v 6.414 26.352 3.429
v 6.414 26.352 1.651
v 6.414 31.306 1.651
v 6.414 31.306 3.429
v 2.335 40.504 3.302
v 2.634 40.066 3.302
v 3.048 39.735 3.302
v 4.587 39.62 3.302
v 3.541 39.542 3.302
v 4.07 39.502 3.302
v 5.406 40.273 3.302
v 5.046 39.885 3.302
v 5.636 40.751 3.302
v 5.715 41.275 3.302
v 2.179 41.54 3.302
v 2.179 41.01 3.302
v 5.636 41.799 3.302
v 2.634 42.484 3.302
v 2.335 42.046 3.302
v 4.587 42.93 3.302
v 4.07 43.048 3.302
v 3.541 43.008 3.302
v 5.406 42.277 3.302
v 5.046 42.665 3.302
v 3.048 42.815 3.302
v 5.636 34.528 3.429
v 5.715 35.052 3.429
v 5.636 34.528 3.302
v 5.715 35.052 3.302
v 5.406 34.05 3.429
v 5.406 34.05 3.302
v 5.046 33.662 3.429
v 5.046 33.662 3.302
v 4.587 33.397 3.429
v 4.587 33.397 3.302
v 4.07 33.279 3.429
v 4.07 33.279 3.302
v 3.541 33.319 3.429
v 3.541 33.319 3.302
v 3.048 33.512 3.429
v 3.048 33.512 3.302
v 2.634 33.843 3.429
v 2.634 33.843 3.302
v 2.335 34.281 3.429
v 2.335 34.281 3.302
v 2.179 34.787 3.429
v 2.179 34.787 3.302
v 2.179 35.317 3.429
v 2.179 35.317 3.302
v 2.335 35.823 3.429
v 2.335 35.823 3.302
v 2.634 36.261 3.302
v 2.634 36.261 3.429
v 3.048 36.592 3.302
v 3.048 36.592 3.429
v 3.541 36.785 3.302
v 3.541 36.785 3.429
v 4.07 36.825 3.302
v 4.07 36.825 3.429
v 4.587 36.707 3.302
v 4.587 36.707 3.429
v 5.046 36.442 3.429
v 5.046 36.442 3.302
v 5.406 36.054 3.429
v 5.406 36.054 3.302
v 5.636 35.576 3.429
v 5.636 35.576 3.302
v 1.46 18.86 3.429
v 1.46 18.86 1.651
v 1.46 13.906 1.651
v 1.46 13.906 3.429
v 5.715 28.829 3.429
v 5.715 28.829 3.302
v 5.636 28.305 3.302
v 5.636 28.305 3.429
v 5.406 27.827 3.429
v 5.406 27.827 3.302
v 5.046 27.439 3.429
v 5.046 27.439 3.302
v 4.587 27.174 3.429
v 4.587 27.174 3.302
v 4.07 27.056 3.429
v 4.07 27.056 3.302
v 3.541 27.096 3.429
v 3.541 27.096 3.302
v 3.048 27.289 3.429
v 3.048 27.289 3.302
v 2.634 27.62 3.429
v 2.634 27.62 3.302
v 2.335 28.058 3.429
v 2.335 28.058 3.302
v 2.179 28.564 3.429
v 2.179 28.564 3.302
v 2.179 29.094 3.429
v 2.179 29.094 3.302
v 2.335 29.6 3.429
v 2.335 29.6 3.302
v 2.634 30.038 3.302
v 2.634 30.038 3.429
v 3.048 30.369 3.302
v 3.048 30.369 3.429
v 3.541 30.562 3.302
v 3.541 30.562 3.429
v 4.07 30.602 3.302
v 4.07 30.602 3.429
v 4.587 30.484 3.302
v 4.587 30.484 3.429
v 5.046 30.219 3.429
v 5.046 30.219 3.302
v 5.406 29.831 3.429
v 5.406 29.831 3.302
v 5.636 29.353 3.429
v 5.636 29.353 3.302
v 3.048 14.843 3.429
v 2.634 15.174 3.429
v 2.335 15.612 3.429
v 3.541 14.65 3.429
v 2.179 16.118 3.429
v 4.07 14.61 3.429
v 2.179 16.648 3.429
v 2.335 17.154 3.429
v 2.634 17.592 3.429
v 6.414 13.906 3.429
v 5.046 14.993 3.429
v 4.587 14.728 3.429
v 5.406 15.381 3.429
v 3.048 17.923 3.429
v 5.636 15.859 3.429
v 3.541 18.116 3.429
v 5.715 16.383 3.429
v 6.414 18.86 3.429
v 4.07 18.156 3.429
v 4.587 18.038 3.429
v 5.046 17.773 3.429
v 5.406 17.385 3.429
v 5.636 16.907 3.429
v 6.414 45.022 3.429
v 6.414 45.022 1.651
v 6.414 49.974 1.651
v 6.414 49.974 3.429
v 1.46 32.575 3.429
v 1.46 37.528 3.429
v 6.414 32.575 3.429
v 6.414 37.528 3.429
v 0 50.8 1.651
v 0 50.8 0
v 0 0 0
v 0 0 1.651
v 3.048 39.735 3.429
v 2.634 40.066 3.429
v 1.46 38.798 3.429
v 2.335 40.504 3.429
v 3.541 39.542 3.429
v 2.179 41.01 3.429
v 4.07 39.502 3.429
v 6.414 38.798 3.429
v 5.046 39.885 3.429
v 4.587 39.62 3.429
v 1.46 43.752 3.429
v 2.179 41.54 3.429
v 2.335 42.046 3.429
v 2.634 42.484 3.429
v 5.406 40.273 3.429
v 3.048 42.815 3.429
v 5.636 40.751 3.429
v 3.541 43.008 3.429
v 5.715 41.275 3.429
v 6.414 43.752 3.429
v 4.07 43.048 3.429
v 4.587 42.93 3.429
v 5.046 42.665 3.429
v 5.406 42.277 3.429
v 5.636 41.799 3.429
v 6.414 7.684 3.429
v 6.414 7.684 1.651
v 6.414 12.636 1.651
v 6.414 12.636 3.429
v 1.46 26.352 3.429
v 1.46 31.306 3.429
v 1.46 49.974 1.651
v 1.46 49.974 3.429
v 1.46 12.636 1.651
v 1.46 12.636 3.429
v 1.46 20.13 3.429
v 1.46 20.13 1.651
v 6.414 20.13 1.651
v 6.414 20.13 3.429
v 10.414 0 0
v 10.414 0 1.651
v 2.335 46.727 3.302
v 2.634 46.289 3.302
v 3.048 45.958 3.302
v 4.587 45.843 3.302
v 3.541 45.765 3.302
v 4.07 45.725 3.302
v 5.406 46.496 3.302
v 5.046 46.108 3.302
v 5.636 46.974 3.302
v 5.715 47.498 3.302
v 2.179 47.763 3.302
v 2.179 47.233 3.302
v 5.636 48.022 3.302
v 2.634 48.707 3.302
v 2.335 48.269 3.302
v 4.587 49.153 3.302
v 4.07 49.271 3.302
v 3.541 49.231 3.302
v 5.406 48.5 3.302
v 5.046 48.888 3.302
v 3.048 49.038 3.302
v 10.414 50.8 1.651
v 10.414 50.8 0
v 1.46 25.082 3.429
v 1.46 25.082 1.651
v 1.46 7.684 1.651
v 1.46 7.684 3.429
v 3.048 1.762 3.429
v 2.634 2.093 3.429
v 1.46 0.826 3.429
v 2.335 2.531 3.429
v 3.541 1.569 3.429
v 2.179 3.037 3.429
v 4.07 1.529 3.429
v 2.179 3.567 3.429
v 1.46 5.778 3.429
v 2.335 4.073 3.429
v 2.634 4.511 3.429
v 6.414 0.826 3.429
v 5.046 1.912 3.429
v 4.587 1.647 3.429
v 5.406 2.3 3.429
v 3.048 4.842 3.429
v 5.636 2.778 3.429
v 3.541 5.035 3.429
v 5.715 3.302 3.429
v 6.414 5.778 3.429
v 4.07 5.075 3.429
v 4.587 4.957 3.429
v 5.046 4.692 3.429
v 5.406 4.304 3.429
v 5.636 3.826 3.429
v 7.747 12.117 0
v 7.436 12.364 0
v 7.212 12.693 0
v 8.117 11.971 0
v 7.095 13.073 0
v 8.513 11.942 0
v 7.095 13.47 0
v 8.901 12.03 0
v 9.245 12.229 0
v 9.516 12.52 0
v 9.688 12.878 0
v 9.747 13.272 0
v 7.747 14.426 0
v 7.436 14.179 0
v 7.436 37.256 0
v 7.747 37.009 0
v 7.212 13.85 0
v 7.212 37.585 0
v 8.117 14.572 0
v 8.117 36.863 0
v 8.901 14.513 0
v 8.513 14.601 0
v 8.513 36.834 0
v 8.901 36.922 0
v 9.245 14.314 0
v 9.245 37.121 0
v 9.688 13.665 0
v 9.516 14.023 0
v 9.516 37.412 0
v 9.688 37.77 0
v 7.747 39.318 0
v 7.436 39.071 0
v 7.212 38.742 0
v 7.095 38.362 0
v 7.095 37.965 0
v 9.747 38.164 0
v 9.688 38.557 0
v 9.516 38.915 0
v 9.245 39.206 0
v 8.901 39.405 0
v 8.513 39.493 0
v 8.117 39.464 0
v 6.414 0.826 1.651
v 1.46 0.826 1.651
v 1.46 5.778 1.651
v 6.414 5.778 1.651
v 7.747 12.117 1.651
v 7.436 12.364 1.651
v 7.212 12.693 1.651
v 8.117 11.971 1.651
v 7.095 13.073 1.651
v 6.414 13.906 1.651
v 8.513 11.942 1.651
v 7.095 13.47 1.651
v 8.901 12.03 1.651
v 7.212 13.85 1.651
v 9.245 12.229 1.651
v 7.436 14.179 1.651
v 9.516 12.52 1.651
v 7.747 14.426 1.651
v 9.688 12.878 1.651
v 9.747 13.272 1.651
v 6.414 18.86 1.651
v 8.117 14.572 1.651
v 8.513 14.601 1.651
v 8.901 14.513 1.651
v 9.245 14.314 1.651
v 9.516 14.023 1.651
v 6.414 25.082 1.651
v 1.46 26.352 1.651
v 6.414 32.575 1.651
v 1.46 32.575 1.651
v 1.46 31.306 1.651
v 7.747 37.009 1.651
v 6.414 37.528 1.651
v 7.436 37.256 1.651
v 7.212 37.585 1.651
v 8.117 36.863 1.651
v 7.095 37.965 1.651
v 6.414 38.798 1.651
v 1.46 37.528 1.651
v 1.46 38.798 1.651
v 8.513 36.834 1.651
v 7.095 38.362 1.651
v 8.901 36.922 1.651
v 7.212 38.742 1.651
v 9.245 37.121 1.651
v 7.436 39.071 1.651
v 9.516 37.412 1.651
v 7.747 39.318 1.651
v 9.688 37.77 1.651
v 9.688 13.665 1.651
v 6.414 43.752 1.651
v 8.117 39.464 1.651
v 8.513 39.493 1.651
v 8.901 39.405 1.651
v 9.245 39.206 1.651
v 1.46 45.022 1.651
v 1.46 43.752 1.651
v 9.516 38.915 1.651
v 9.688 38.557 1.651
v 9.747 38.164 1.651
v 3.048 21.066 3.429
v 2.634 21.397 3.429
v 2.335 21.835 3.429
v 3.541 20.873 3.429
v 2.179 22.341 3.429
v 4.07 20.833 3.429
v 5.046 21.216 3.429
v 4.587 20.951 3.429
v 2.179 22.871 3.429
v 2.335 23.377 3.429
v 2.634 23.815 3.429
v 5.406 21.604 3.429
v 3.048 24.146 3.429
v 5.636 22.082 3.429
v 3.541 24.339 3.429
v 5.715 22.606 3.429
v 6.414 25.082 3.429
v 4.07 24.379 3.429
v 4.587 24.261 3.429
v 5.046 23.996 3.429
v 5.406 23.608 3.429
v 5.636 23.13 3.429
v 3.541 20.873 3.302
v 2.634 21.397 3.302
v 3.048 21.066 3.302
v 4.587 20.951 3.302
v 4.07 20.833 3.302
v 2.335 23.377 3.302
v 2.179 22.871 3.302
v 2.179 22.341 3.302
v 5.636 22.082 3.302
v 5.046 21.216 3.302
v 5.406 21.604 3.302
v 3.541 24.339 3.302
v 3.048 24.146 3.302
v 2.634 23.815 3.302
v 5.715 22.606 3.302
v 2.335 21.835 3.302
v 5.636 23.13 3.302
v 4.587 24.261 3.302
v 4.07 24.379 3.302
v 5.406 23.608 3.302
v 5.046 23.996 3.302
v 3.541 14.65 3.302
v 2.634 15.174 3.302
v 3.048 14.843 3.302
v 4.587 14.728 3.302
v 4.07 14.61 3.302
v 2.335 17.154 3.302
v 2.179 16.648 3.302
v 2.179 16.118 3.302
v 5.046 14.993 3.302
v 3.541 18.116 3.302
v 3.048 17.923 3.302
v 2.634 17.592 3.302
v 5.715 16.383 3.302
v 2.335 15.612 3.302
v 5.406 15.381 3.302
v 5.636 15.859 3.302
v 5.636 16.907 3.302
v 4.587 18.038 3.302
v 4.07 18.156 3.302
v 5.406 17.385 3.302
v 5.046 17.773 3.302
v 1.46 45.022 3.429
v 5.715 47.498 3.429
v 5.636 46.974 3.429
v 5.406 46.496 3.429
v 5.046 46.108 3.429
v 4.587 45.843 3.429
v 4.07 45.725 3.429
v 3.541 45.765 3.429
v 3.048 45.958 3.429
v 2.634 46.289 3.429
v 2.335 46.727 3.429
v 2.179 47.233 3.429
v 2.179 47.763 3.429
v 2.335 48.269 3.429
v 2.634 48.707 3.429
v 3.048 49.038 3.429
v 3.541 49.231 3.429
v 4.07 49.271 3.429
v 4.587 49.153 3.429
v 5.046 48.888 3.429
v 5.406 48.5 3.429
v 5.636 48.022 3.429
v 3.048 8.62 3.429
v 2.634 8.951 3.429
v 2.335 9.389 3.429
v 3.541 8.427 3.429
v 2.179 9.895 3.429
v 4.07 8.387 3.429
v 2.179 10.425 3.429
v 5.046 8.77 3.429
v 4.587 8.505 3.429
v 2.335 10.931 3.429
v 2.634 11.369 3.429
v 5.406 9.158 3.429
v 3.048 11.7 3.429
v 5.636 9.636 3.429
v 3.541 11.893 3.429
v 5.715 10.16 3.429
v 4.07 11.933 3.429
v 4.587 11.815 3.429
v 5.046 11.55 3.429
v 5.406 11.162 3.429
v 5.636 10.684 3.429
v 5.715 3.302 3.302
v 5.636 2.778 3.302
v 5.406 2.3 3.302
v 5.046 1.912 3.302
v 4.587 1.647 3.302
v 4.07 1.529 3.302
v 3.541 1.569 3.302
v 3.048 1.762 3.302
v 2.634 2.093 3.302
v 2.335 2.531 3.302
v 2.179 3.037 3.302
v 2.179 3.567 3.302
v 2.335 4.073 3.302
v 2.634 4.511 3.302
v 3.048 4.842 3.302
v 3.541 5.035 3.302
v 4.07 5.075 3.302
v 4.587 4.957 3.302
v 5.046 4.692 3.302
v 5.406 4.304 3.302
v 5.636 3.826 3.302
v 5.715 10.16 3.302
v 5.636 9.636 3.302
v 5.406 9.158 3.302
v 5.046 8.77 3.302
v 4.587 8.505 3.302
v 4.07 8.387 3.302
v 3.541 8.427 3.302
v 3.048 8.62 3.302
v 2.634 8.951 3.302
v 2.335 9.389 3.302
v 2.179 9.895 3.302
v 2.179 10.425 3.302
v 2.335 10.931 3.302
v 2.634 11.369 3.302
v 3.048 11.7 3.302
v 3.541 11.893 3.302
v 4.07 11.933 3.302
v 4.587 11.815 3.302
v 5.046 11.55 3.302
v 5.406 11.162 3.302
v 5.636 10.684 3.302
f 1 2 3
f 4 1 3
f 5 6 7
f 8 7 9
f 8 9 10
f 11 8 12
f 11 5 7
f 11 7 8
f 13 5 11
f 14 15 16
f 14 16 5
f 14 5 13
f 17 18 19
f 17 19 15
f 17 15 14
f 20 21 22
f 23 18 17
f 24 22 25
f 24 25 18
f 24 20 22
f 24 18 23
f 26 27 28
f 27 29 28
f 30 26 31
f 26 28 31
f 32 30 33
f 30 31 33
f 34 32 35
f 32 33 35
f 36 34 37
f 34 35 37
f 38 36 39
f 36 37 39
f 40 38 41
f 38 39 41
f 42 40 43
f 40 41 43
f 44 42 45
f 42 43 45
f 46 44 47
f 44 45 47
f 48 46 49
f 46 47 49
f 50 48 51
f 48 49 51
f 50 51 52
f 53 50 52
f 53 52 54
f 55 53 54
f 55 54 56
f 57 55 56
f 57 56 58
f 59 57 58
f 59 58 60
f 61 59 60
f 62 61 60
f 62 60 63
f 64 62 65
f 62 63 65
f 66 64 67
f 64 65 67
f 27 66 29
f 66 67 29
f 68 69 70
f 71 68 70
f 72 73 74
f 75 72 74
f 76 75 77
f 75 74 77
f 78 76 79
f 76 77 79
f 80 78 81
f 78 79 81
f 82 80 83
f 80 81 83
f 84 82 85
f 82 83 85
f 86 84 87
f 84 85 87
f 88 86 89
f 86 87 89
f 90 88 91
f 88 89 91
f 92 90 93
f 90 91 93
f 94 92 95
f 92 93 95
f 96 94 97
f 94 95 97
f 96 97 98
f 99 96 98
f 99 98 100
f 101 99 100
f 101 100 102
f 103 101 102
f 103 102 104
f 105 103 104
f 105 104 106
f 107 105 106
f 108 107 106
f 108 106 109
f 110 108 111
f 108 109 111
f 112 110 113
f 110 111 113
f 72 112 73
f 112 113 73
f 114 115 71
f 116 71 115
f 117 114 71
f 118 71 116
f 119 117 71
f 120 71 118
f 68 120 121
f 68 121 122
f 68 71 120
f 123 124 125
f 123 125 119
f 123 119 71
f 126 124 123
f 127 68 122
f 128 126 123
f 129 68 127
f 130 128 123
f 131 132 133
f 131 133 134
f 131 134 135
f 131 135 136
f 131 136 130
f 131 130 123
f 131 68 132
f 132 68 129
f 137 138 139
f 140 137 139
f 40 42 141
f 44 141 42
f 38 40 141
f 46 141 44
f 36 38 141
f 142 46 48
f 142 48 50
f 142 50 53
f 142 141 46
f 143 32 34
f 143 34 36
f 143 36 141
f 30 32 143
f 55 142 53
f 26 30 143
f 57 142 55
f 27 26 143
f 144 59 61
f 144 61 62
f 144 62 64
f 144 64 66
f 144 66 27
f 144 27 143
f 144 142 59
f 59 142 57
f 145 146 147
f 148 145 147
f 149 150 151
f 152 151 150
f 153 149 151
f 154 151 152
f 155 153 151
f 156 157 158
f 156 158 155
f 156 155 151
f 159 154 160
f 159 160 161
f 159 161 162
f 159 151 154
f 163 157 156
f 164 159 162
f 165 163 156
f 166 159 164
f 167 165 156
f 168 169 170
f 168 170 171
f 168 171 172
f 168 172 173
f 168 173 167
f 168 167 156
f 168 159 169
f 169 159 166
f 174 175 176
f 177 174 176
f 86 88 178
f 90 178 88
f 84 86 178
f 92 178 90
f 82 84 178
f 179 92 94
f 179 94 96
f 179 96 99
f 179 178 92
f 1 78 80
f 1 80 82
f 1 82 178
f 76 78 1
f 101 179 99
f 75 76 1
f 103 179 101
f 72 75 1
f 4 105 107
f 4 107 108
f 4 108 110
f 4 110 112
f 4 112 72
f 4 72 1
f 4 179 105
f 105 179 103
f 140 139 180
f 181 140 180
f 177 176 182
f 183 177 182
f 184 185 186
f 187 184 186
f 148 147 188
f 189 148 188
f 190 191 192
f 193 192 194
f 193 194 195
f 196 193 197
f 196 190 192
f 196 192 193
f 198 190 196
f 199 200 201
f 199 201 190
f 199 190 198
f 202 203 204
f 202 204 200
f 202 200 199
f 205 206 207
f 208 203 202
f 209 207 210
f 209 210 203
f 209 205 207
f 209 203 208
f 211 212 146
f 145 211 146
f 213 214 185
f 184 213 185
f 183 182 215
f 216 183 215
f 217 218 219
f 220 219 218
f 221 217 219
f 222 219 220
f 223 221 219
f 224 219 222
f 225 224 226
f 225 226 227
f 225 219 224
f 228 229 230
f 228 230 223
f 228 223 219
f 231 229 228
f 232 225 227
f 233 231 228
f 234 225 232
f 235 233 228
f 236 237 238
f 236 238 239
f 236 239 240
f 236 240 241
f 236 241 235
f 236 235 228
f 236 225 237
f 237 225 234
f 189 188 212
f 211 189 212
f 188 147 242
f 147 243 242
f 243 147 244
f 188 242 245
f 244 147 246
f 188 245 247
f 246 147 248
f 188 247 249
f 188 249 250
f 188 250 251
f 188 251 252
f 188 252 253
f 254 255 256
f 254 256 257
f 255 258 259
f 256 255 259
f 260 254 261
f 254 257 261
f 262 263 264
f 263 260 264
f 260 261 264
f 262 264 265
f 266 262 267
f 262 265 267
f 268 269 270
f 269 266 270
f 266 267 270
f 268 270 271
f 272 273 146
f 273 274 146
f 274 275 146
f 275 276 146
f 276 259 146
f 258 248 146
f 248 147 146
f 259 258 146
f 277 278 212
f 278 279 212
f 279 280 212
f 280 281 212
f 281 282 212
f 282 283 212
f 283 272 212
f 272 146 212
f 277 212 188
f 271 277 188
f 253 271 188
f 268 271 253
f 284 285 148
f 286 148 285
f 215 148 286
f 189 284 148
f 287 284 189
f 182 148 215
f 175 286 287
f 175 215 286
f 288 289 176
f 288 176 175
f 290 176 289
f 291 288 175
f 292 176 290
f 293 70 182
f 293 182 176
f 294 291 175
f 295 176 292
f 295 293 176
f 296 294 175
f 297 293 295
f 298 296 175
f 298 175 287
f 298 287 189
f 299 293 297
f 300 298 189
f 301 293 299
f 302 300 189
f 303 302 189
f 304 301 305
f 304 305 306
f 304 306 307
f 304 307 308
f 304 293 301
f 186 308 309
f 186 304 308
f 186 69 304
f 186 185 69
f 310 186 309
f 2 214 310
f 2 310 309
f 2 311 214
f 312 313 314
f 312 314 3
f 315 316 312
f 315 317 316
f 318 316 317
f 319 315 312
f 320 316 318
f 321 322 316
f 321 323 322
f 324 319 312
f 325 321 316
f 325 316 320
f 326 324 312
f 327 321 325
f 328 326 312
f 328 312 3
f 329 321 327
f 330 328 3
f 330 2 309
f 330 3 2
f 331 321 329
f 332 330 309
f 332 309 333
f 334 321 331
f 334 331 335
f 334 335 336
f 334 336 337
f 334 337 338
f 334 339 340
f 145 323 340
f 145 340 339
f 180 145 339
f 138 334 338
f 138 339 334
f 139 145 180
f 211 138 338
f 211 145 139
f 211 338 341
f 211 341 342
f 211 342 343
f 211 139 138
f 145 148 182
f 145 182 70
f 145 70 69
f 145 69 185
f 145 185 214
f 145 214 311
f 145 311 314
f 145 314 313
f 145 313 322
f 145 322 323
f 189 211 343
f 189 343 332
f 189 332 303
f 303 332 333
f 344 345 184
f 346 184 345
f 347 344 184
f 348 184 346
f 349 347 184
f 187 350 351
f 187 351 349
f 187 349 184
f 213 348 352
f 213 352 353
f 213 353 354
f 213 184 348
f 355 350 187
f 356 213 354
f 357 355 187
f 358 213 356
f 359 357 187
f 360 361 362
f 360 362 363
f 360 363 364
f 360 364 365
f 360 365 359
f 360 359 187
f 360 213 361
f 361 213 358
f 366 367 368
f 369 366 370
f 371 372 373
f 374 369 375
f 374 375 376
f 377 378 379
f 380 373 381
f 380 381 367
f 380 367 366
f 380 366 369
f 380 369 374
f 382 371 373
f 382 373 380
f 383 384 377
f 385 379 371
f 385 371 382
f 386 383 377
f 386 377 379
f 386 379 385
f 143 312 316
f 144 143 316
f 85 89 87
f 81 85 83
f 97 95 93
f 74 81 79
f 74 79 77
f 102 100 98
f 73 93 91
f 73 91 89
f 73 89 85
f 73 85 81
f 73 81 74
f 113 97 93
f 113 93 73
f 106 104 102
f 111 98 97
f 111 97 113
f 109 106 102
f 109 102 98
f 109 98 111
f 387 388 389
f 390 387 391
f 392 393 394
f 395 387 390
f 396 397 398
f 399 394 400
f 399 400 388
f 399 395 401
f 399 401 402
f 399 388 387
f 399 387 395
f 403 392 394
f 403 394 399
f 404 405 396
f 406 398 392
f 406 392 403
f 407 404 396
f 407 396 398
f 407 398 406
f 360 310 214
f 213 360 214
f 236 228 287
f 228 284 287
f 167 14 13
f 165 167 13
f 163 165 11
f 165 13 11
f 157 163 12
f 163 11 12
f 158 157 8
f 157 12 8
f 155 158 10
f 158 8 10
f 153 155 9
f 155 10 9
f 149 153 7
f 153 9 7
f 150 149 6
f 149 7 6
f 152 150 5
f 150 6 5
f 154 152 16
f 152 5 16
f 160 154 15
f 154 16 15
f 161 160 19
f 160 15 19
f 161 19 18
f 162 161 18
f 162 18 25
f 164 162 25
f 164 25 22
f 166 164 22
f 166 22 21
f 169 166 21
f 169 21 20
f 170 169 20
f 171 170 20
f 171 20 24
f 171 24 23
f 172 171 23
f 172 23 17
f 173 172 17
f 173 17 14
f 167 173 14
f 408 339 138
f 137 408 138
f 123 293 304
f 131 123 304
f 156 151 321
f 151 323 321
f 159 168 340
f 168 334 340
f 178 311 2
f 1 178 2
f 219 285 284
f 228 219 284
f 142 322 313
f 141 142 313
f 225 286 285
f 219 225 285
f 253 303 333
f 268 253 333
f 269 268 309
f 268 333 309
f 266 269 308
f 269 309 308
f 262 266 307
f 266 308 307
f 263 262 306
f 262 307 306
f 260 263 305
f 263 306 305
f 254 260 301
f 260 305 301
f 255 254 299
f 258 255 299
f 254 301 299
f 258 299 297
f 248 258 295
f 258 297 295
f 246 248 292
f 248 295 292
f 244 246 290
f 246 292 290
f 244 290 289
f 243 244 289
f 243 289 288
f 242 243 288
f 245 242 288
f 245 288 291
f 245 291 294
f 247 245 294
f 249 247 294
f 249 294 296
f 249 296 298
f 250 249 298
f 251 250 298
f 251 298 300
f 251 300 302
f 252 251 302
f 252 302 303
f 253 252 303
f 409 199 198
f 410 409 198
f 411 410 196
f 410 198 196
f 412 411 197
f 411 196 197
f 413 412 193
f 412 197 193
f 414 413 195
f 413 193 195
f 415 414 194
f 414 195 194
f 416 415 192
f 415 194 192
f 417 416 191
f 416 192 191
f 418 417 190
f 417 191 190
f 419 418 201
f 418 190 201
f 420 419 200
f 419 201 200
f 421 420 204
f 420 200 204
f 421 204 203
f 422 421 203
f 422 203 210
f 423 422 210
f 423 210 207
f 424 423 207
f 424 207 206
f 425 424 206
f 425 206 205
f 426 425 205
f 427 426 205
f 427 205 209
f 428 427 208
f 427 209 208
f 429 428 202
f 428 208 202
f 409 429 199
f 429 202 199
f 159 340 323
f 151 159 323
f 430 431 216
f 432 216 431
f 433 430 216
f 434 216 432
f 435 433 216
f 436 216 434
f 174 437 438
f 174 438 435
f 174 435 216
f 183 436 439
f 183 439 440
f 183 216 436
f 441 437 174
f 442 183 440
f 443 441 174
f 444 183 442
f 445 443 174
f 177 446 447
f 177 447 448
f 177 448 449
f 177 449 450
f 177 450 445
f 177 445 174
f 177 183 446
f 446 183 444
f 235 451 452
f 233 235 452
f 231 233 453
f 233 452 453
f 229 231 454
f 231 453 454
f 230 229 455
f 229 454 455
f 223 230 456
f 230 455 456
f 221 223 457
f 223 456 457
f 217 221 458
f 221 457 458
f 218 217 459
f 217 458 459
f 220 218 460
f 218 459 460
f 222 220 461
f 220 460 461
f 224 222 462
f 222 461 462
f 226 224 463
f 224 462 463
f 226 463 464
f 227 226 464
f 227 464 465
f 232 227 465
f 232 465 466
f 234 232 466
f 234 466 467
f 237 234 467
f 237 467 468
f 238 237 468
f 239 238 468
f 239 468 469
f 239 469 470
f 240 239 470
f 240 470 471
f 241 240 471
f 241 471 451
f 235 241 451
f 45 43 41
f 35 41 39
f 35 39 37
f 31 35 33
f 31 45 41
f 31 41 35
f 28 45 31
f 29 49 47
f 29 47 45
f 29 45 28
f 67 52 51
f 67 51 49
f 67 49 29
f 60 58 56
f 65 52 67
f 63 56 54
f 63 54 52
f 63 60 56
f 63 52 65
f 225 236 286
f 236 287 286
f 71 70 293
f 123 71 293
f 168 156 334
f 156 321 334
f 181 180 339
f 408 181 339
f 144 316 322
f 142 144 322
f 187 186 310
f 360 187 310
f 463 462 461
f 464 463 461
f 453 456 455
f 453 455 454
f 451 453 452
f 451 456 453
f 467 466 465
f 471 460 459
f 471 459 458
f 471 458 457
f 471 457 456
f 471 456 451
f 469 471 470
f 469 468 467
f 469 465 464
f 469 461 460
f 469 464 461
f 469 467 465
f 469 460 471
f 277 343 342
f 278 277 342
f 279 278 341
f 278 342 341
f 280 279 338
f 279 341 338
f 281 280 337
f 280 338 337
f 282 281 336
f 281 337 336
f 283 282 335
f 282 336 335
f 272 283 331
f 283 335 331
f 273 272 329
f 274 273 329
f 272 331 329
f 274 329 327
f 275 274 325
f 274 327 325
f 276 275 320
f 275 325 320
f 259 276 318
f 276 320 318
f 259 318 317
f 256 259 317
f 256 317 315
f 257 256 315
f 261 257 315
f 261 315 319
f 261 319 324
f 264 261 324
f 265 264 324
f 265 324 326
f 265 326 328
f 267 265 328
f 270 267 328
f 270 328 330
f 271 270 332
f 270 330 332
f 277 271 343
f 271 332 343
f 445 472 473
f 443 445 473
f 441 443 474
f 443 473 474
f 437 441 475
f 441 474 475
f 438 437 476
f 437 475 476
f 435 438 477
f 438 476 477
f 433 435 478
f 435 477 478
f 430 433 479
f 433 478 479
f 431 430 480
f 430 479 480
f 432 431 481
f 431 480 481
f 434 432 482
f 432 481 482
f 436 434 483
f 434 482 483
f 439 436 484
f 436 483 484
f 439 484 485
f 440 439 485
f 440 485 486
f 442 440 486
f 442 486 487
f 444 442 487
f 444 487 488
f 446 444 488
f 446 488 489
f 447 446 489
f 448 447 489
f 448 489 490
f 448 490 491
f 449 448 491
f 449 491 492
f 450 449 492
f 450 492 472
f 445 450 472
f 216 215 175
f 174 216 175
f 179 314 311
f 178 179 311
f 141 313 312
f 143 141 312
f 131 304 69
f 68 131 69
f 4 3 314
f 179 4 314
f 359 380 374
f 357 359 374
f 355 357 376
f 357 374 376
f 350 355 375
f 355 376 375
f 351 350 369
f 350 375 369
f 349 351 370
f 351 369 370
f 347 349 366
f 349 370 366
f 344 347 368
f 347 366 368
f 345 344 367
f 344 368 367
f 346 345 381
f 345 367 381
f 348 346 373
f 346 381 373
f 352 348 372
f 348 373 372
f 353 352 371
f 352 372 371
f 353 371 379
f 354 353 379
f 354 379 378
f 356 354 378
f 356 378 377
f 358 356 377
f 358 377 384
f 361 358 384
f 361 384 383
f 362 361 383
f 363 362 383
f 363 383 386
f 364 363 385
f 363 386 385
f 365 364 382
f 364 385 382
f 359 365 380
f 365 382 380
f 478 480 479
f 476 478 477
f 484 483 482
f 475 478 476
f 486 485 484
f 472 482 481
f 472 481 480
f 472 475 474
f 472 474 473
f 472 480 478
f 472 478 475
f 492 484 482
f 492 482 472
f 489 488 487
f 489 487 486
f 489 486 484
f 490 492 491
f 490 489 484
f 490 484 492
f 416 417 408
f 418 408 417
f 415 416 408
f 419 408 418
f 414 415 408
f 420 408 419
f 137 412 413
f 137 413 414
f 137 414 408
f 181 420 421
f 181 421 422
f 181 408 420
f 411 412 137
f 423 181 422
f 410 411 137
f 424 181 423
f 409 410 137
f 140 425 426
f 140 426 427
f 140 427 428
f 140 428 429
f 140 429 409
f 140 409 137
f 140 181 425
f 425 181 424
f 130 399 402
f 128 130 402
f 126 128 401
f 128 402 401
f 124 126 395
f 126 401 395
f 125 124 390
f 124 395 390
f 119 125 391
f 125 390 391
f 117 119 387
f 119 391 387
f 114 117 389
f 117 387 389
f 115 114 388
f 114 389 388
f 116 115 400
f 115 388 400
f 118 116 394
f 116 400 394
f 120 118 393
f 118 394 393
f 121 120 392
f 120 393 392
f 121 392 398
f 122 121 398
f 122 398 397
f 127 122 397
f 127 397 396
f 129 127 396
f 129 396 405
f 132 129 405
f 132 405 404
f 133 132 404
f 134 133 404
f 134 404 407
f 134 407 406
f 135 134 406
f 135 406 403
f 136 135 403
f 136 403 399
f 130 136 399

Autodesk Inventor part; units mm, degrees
ref_plane "YZ Plane" through (0, 0, 0) normal (1, 0, 0) x (0, 1, 0)
ref_plane "XZ Plane" through (0, 0, 0) normal (0, 1, 0) x (-1, 0, 0)
ref_plane "XY Plane" through (0, 0, 0) normal (0, 0, 1) x (1, 0, 0)
sketch "Sketch1" plane through (0, 0, 0) normal (0, 0, 1) x (1, 0, 0)
  line L0 (0, 0) -> (10.414, 0)
  line L1 (10.414, 0) -> (10.414, 50.8)
  line L2 (10.414, 50.8) -> (0, 50.8)
  line L3 (0, 50.8) -> (0, 0)
  dimension "d0" = 10.414
  dimension "d1" = 50.8
extrude "Extrusion1" add sketch "Sketch1" along normal blind 1.651
sketch "Sketch2" plane through (0, 0, 1.651) normal (0, 0, 1) x (1, 0, 0)
  line L0 (0, 0) -> (10.414, 0) projected
  line L1 (5.207, 0) -> (3.937, 0)
  line L2 (3.937, 0) -> (3.937, 3.302)
  circle A0 centre (3.937, 3.302) radius 1.778
  line L3 (10.414, 50.8) -> (0, 50.8) projected
  line L4 (5.207, 50.8) -> (3.937, 50.8)
  line L5 (3.937, 50.8) -> (3.937, 47.498)
  circle A1 centre (3.937, 47.498) radius 1.778
  line L6 (3.937, 47.498) -> (3.937, 41.275)
  line L7 (3.937, 41.275) -> (3.937, 35.052)
  line L8 (3.937, 35.052) -> (3.937, 28.829)
  line L9 (3.937, 28.829) -> (3.937, 22.606)
  line L10 (3.937, 22.606) -> (3.937, 16.383)
  line L11 (3.937, 16.383) -> (3.937, 10.16)
  line L12 (3.937, 10.16) -> (3.937, 3.302)
  circle A2 centre (3.937, 10.16) radius 1.778
  circle A3 centre (3.937, 16.383) radius 1.778
  circle A4 centre (3.937, 22.606) radius 1.778
  circle A5 centre (3.937, 28.829) radius 1.778
  circle A6 centre (3.937, 35.052) radius 1.778
  circle A7 centre (3.937, 41.275) radius 1.778
  line L13 (1.4605, 45.0215) -> (6.4135, 45.0215)
  line L14 (6.4135, 45.0215) -> (6.4135, 49.9745)
  line L15 (6.4135, 49.9745) -> (1.4605, 49.9745)
  line L16 (1.4605, 49.9745) -> (1.4605, 45.0215)
  line L17 (1.4605, 45.0215) -> (6.4135, 49.9745) construction
  line L18 (6.4135, 45.0215) -> (1.4605, 49.9745) construction
  line L19 (1.4605, 38.7985) -> (6.4135, 38.7985)
  line L20 (6.4135, 38.7985) -> (6.4135, 43.7515)
  line L21 (6.4135, 43.7515) -> (1.4605, 43.7515)
  line L22 (1.4605, 43.7515) -> (1.4605, 38.7985)
  line L23 (1.4605, 38.7985) -> (6.4135, 43.7515) construction
  line L24 (6.4135, 38.7985) -> (1.4605, 43.7515) construction
  line L25 (1.4605, 32.5755) -> (6.4135, 32.5755)
  line L26 (6.4135, 32.5755) -> (6.4135, 37.5285)
  line L27 (6.4135, 37.5285) -> (1.4605, 37.5285)
  line L28 (1.4605, 37.5285) -> (1.4605, 32.5755)
  line L29 (1.4605, 32.5755) -> (6.4135, 37.5285) construction
  line L30 (6.4135, 32.5755) -> (1.4605, 37.5285) construction
  line L31 (1.4605, 26.3525) -> (6.4135, 26.3525)
  line L32 (6.4135, 26.3525) -> (6.4135, 31.3055)
  line L33 (6.4135, 31.3055) -> (1.4605, 31.3055)
  line L34 (1.4605, 31.3055) -> (1.4605, 26.3525)
  line L35 (1.4605, 26.3525) -> (6.4135, 31.3055) construction
  line L36 (6.4135, 26.3525) -> (1.4605, 31.3055) construction
  line L37 (1.4605, 20.1295) -> (6.4135, 20.1295)
  line L38 (6.4135, 20.1295) -> (6.4135, 25.0825)
  line L39 (6.4135, 25.0825) -> (1.4605, 25.0825)
  line L40 (1.4605, 25.0825) -> (1.4605, 20.1295)
  line L41 (1.4605, 20.1295) -> (6.4135, 25.0825) construction
  line L42 (6.4135, 20.1295) -> (1.4605, 25.0825) construction
  line L43 (1.4605, 13.9065) -> (6.4135, 13.9065)
  line L44 (6.4135, 13.9065) -> (6.4135, 18.8595)
  line L45 (6.4135, 18.8595) -> (1.4605, 18.8595)
  line L46 (1.4605, 18.8595) -> (1.4605, 13.9065)
  line L47 (1.4605, 13.9065) -> (6.4135, 18.8595) construction
  line L48 (6.4135, 13.9065) -> (1.4605, 18.8595) construction
  line L49 (1.4605, 7.6835) -> (6.4135, 7.6835)
  line L50 (6.4135, 7.6835) -> (6.4135, 12.6365)
  line L51 (6.4135, 12.6365) -> (1.4605, 12.6365)
  line L52 (1.4605, 12.6365) -> (1.4605, 7.6835)
  line L53 (1.4605, 7.6835) -> (6.4135, 12.6365) construction
  line L54 (6.4135, 7.6835) -> (1.4605, 12.6365) construction
  line L55 (1.4605, 0.8255) -> (6.4135, 0.8255)
  line L56 (6.4135, 0.8255) -> (6.4135, 5.7785)
  line L57 (6.4135, 5.7785) -> (1.4605, 5.7785)
  line L58 (1.4605, 5.7785) -> (1.4605, 0.8255)
  line L59 (1.4605, 0.8255) -> (6.4135, 5.7785) construction
  line L60 (6.4135, 0.8255) -> (1.4605, 5.7785) construction
  dimension "d4" = 1.27
  dimension "d5" = 3.302
  dimension "d6" = 3.556
  dimension "d7" = 3.302
  dimension "d8" = 3.556
  dimension "d9" = 6.223
  dimension "d10" = 6.223
  dimension "d11" = 6.223
  dimension "d12" = 6.223
  dimension "d13" = 6.223
  dimension "d14" = 6.223
  dimension "d15" = 3.556
  dimension "d16" = 3.556
  dimension "d17" = 3.556
  dimension "d18" = 3.556
  dimension "d19" = 3.556
  dimension "d20" = 3.556
  dimension "d21" = 4.953
  dimension "d22" = 4.953
  dimension "d23" = 4.953
  dimension "d24" = 4.953
  dimension "d25" = 4.953
  dimension "d26" = 4.953
  dimension "d27" = 4.953
  dimension "d28" = 4.953
  dimension "d29" = 4.953
  dimension "d30" = 4.953
  dimension "d31" = 4.953
  dimension "d32" = 4.953
extrude "Extrusion2" add sketch "Sketch2" along normal blind 1.778 contours L55 L58 L57 L12 A0 L2 | L13 L16 L15 L5 A1 L6 | L6 A1 L5 L15 L14 L13 | L19 L22 L21 L6 A7 L7 | L7 A7 L6 L21 L20 L19 | L25 L28 L27 L7 A6 L8 | L8 A6 L7 L27 L26 L25 | L31 L34 L33 L8 A5 L9 | L9 A5 L8 L33 L32 L31 | L37 L40 L39 L9 A4 L10 | L10 A4 L9 L39 L38 L37 | L43 L46 L45 L10 A3 L11 | L11 A3 L10 L45 L44 L43 | L49 L52 L51 L11 A2 L12 | L12 A2 L11 L51 L50 L49 | L2 A0 L12 L57 L56 L55
sketch "Sketch3" plane through (0, 0, 1.651) normal (0, 0, 1) x (1, 0, 0)
  circle A0 centre (3.937, 3.302) radius 1.778 projected
  circle A1 centre (3.937, 3.302) radius 1.778
  circle A2 centre (3.937, 10.16) radius 1.778 projected
  circle A3 centre (3.937, 10.16) radius 1.778
  circle A4 centre (3.937, 16.383) radius 1.778 projected
  circle A5 centre (3.937, 16.383) radius 1.778
  circle A6 centre (3.937, 22.606) radius 1.778 projected
  circle A7 centre (3.937, 22.606) radius 1.778
  circle A8 centre (3.937, 28.829) radius 1.778 projected
  circle A9 centre (3.937, 28.829) radius 1.778
  circle A10 centre (3.937, 35.052) radius 1.778 projected
  circle A11 centre (3.937, 35.052) radius 1.778
  circle A12 centre (3.937, 41.275) radius 1.778 projected
  circle A13 centre (3.937, 41.275) radius 1.778
  circle A14 centre (3.937, 47.498) radius 1.778 projected
  circle A15 centre (3.937, 47.498) radius 1.778
  point P0 (0, 0)
extrude "Extrusion3" add sketch "Sketch3" along normal blind 1.651
sketch "Sketch4" plane through (0, 0, 1.651) normal (0, 0, 1) x (1, 0, 0)
  line L0 (1.4605, 12.6365) -> (6.4135, 12.6365) projected
  line L1 (6.4135, 13.9065) -> (6.4135, 18.8595) projected
  line L2 (6.4135, 12.6365) -> (6.4135, 13.9065)
  line L3 (6.4135, 13.9065) -> (6.4135, 13.2715)
  line L4 (10.414, 0) -> (10.414, 50.8) projected
  line L5 (10.414, 13.2715) -> (6.4135, 13.2715)
  circle A0 centre (8.4138, 13.2715) radius 1.3335
  line L6 (1.4605, 37.5285) -> (6.4135, 37.5285) projected
  line L7 (6.4135, 38.7985) -> (6.4135, 37.5285)
  line L8 (6.4135, 38.1635) -> (10.414, 38.1635)
  circle A1 centre (8.4138, 38.1635) radius 1.3335
  point P0 (0, 0)
extrude "Extrusion4" cut sketch "Sketch4" against normal blind 1.651
properties part number "Neopixel_Stick"
